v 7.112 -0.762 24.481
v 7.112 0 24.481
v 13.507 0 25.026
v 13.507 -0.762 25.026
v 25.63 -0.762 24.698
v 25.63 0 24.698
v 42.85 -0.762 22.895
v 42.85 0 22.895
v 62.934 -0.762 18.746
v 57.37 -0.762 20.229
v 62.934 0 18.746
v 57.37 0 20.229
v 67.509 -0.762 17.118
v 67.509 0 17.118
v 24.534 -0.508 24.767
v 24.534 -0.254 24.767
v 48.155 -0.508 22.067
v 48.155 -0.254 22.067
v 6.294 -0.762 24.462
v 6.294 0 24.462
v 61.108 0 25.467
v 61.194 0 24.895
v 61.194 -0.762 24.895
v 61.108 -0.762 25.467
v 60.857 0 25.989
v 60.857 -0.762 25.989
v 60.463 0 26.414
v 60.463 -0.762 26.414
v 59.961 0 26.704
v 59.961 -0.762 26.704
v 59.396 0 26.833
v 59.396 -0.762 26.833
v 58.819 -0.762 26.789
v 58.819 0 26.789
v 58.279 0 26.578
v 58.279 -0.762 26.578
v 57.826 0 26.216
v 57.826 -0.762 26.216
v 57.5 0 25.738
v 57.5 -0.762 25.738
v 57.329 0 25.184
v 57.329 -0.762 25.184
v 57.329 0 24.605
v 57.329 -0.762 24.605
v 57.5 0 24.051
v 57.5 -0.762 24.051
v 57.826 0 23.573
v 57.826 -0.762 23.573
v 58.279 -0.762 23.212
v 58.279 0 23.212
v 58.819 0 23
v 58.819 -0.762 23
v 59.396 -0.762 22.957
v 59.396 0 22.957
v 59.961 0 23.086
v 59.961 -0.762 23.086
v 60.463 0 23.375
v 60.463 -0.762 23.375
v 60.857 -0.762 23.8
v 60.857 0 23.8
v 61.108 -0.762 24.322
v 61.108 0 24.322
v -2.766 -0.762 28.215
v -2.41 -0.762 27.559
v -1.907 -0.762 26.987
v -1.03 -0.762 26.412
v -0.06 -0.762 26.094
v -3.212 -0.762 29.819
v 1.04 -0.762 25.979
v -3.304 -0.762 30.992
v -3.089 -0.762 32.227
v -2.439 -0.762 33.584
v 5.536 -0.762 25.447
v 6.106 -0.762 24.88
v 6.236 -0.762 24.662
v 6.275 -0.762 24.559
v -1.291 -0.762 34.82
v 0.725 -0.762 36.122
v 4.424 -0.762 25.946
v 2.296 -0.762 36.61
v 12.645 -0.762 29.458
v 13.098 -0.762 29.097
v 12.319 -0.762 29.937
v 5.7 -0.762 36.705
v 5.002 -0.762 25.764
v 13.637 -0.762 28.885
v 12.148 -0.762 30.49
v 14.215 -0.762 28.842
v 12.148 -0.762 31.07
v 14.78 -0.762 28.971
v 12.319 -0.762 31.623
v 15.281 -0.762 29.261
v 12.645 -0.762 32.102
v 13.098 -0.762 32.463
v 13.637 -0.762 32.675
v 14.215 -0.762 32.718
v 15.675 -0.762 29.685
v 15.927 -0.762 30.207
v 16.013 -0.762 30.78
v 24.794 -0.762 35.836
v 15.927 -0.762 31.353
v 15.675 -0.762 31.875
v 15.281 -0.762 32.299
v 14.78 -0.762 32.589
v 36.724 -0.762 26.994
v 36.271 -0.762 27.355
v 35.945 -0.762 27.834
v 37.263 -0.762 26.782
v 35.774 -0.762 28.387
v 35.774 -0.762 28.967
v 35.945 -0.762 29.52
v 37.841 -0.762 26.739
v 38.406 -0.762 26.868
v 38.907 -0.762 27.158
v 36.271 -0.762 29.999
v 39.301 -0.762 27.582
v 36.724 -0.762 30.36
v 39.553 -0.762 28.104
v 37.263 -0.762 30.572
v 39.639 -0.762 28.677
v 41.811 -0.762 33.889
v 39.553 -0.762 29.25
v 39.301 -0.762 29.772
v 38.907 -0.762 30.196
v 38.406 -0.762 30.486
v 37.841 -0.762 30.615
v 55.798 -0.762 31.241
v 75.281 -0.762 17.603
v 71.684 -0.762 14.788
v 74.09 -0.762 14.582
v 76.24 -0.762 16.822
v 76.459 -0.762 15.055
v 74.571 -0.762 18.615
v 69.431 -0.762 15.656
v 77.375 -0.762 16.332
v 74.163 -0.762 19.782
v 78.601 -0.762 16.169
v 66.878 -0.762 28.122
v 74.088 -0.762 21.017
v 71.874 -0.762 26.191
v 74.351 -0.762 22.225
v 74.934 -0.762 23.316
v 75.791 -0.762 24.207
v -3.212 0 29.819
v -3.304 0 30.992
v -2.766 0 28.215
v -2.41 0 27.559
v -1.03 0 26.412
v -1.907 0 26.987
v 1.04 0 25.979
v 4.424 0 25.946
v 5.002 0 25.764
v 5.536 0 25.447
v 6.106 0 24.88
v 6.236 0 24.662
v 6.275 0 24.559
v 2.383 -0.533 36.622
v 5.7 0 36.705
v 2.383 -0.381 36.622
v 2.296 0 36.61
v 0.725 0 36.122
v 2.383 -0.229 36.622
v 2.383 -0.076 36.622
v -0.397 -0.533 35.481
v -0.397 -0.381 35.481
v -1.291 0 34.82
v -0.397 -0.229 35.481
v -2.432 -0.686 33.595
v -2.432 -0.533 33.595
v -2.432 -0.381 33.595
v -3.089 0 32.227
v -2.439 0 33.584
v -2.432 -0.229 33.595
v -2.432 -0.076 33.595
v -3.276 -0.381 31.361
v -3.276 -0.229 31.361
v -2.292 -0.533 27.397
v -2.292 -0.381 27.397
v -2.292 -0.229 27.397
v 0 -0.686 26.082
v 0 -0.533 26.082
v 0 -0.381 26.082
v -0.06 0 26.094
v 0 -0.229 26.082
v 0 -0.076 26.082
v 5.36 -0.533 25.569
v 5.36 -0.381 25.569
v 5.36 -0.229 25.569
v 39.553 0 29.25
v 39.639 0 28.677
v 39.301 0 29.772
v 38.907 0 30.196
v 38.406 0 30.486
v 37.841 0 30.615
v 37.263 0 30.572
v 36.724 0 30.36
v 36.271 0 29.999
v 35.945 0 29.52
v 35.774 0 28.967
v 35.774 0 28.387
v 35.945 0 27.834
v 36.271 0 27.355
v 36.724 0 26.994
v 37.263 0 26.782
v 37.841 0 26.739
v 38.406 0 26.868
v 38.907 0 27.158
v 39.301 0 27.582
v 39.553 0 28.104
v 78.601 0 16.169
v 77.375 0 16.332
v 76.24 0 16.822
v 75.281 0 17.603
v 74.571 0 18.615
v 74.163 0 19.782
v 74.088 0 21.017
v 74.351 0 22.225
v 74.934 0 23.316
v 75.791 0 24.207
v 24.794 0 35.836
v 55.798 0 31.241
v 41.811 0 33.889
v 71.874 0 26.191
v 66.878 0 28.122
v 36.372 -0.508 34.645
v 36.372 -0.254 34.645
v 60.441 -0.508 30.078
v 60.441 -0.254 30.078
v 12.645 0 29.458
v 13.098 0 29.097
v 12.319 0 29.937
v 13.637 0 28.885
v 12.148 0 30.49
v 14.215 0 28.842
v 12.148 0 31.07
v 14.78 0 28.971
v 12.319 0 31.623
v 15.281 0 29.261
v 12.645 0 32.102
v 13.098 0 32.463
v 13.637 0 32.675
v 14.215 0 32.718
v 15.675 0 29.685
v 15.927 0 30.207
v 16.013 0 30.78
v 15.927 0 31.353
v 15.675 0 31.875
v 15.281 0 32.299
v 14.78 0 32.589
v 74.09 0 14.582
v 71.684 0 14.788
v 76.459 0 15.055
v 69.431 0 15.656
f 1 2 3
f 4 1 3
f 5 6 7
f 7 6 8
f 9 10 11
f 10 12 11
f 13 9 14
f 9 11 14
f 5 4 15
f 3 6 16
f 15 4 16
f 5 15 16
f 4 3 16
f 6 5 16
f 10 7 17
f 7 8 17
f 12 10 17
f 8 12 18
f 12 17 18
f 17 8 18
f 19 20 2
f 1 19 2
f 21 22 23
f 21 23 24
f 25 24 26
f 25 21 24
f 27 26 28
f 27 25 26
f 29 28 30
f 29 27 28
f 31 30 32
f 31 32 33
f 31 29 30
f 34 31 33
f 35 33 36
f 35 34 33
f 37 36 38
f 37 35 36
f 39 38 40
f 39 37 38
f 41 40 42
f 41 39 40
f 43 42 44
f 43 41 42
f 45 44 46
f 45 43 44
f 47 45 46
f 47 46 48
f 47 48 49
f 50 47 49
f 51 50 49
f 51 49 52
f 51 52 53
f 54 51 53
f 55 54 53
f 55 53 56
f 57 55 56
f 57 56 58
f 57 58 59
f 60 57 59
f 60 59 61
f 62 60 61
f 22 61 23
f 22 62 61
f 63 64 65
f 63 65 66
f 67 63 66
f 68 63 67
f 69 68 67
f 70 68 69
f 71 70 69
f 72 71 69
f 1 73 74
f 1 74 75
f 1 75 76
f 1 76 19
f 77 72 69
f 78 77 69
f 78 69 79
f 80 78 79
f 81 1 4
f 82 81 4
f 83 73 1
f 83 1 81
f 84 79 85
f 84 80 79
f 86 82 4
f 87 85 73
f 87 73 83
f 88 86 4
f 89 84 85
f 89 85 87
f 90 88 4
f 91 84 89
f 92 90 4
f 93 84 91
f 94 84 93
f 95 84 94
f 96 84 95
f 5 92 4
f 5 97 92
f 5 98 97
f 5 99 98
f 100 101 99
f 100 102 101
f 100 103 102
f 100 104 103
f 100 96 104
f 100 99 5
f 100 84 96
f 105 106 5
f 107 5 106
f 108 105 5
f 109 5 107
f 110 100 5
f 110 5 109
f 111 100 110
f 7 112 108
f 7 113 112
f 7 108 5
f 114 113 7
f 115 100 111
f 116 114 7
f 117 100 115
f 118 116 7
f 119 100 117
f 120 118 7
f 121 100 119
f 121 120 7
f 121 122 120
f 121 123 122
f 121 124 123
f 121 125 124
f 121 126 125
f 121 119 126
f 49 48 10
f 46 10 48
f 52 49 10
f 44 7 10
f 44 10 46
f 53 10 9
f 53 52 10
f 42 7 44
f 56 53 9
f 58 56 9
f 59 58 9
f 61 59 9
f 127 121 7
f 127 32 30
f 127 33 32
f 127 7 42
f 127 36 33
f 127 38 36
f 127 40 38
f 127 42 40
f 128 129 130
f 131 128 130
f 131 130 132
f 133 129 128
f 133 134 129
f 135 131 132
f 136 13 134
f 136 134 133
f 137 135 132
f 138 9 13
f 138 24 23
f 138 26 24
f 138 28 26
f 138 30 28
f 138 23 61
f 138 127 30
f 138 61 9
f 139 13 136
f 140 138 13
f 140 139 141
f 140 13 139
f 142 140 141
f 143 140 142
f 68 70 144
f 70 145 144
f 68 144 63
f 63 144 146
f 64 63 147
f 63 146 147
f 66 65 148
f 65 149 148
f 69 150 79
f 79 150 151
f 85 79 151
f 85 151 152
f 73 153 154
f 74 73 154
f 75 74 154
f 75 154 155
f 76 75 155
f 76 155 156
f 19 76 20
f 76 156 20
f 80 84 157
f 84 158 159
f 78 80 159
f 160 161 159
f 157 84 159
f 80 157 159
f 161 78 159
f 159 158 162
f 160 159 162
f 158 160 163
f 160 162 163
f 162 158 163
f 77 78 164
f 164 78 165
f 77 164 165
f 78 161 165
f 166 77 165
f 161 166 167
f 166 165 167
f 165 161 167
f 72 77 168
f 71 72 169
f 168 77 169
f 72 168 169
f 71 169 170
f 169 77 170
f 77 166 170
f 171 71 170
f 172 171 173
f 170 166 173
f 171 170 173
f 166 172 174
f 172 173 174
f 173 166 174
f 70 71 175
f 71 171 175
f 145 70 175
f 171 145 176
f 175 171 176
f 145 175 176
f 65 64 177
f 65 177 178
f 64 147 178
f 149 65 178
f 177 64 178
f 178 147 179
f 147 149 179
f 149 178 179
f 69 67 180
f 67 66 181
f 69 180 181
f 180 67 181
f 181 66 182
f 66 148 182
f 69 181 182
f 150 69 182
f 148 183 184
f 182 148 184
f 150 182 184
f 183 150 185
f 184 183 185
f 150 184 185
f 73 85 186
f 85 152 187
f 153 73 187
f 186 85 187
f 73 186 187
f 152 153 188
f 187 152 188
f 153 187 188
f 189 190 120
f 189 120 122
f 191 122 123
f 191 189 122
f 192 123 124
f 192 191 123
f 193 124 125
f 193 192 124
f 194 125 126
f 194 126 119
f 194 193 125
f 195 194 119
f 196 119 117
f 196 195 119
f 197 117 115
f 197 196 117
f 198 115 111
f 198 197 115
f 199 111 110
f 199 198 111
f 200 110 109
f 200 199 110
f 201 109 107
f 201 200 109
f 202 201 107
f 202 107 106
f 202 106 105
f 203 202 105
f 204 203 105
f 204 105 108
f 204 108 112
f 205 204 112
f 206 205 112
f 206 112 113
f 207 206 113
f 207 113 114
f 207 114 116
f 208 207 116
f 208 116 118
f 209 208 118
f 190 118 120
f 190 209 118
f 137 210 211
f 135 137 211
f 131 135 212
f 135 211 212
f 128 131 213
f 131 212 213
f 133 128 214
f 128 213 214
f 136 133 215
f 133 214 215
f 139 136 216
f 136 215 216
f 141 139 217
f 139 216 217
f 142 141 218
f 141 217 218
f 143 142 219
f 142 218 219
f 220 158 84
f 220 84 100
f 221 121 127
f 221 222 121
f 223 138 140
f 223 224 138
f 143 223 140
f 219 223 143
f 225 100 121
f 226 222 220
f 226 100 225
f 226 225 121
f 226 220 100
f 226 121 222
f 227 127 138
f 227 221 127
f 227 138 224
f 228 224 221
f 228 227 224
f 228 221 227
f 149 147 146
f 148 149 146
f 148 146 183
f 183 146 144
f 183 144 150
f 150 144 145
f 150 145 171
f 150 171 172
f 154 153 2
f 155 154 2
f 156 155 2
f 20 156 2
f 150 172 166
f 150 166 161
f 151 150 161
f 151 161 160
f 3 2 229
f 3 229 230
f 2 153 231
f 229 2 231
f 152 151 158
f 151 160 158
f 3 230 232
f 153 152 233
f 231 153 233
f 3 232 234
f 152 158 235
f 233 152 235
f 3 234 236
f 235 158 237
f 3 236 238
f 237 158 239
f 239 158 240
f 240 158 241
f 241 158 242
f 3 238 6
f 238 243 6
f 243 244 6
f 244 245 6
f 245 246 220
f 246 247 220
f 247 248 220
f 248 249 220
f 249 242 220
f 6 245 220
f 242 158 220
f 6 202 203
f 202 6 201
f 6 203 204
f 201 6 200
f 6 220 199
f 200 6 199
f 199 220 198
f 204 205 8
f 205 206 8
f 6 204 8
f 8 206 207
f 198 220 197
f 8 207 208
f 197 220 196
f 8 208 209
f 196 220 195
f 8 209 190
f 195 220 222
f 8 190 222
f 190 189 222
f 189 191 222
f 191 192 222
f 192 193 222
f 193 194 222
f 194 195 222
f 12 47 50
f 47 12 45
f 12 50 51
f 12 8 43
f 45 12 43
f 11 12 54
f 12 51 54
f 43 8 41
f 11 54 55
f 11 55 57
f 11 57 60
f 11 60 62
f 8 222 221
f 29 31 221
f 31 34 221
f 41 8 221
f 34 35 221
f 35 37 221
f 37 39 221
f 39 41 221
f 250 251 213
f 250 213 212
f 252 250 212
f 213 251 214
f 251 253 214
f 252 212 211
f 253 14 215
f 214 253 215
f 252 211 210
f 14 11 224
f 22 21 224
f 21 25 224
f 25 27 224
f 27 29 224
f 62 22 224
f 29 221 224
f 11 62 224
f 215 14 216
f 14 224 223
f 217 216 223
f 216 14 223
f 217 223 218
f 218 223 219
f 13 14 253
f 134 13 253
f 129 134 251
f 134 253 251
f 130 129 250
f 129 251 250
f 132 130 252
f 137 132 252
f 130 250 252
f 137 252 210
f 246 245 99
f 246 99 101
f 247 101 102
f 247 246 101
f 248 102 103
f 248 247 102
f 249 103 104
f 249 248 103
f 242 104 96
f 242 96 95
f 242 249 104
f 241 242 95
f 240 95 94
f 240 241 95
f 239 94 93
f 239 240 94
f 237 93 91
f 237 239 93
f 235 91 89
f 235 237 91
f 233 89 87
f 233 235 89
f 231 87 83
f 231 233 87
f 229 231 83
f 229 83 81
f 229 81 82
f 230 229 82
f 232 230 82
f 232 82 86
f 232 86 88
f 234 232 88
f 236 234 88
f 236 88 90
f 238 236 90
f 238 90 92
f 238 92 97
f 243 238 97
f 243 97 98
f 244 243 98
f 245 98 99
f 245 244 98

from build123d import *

# Parameters (mm, degrees)
F0_R     = 1.9433304257
F1_DEPTH = 0.762


with BuildPart() as f1:
    # F0 (on Front) → F1 (new body)
    with BuildSketch(Plane.XZ):
        with BuildLine():
            Line((6.2936257383, 24.461550422), (7.1120347588, 24.4810397347))
            add(Edge.make_bspline(
                [(7.1120347588, 24.4810397347), (17.9456137121, 26.5047568312), (53.7778158942, 22.9459838156), (67.5089657307, 17.11815963)],
                knots=[0, 0, 0, 0, 60.8440734522, 60.8440734522, 60.8440734522, 60.8440734522], degree=3))
            ThreePointArc((67.5089657307, 17.11815963), (72.8801181474, 14.599466087), (78.6011303451, 16.1688974746))
            ThreePointArc((78.6011303451, 16.1688974746), (74.3264231683, 19.1846421759), (75.7914702211, 24.2067408093))
            add(Edge.make_bspline(
                [(5.7000220775, 36.7046440834), (38.9690002201, 36.2990938844), (65.5050632655, 30.3288914663), (75.7914702211, 24.2067408093)],
                knots=[49.2791244048, 49.2791244048, 49.2791244048, 49.2791244048, 120.8674737906, 120.8674737906, 120.8674737906, 120.8674737906], degree=3))
            add(Edge.make_bspline(
                [(5.7000220775, 36.7046440834), (4.7674111969, 36.56907093), (2.2736360124, 36.9596356417), (-0.4323623378, 35.5931844536), (-2.5996584226, 33.7701513912), (-3.4412804307, 31.3763545138), (-3.1953223859, 29.4315883565), (-2.5118643312, 27.1796604923), (-0.0556685355, 25.7171333042), (3.5084893901, 26.1674166375), (5.3193226774, 25.8164517785), (6.2642945965, 24.7922272319), (6.2936257383, 24.461550422)],
                knots=[0, 0, 0, 0, 0.1158549783, 0.2261015206, 0.3320412877, 0.430315022, 0.5187678093, 0.6131658652, 0.7165545118, 0.83594527, 0.9234489622, 1, 1, 1, 1], degree=3))
        make_face()
        with Locations((59.2509422454, 24.8946035713)):
            Circle(F0_R, mode=Mode.SUBTRACT)
        with Locations((14.0698300675, 30.7800769806)):
            Circle(F0_R, mode=Mode.SUBTRACT)
        with Locations((37.6955829561, 28.6768935621)):
            Circle(F0_R, mode=Mode.SUBTRACT)
    extrude(amount=F1_DEPTH)


solid = f1.part
